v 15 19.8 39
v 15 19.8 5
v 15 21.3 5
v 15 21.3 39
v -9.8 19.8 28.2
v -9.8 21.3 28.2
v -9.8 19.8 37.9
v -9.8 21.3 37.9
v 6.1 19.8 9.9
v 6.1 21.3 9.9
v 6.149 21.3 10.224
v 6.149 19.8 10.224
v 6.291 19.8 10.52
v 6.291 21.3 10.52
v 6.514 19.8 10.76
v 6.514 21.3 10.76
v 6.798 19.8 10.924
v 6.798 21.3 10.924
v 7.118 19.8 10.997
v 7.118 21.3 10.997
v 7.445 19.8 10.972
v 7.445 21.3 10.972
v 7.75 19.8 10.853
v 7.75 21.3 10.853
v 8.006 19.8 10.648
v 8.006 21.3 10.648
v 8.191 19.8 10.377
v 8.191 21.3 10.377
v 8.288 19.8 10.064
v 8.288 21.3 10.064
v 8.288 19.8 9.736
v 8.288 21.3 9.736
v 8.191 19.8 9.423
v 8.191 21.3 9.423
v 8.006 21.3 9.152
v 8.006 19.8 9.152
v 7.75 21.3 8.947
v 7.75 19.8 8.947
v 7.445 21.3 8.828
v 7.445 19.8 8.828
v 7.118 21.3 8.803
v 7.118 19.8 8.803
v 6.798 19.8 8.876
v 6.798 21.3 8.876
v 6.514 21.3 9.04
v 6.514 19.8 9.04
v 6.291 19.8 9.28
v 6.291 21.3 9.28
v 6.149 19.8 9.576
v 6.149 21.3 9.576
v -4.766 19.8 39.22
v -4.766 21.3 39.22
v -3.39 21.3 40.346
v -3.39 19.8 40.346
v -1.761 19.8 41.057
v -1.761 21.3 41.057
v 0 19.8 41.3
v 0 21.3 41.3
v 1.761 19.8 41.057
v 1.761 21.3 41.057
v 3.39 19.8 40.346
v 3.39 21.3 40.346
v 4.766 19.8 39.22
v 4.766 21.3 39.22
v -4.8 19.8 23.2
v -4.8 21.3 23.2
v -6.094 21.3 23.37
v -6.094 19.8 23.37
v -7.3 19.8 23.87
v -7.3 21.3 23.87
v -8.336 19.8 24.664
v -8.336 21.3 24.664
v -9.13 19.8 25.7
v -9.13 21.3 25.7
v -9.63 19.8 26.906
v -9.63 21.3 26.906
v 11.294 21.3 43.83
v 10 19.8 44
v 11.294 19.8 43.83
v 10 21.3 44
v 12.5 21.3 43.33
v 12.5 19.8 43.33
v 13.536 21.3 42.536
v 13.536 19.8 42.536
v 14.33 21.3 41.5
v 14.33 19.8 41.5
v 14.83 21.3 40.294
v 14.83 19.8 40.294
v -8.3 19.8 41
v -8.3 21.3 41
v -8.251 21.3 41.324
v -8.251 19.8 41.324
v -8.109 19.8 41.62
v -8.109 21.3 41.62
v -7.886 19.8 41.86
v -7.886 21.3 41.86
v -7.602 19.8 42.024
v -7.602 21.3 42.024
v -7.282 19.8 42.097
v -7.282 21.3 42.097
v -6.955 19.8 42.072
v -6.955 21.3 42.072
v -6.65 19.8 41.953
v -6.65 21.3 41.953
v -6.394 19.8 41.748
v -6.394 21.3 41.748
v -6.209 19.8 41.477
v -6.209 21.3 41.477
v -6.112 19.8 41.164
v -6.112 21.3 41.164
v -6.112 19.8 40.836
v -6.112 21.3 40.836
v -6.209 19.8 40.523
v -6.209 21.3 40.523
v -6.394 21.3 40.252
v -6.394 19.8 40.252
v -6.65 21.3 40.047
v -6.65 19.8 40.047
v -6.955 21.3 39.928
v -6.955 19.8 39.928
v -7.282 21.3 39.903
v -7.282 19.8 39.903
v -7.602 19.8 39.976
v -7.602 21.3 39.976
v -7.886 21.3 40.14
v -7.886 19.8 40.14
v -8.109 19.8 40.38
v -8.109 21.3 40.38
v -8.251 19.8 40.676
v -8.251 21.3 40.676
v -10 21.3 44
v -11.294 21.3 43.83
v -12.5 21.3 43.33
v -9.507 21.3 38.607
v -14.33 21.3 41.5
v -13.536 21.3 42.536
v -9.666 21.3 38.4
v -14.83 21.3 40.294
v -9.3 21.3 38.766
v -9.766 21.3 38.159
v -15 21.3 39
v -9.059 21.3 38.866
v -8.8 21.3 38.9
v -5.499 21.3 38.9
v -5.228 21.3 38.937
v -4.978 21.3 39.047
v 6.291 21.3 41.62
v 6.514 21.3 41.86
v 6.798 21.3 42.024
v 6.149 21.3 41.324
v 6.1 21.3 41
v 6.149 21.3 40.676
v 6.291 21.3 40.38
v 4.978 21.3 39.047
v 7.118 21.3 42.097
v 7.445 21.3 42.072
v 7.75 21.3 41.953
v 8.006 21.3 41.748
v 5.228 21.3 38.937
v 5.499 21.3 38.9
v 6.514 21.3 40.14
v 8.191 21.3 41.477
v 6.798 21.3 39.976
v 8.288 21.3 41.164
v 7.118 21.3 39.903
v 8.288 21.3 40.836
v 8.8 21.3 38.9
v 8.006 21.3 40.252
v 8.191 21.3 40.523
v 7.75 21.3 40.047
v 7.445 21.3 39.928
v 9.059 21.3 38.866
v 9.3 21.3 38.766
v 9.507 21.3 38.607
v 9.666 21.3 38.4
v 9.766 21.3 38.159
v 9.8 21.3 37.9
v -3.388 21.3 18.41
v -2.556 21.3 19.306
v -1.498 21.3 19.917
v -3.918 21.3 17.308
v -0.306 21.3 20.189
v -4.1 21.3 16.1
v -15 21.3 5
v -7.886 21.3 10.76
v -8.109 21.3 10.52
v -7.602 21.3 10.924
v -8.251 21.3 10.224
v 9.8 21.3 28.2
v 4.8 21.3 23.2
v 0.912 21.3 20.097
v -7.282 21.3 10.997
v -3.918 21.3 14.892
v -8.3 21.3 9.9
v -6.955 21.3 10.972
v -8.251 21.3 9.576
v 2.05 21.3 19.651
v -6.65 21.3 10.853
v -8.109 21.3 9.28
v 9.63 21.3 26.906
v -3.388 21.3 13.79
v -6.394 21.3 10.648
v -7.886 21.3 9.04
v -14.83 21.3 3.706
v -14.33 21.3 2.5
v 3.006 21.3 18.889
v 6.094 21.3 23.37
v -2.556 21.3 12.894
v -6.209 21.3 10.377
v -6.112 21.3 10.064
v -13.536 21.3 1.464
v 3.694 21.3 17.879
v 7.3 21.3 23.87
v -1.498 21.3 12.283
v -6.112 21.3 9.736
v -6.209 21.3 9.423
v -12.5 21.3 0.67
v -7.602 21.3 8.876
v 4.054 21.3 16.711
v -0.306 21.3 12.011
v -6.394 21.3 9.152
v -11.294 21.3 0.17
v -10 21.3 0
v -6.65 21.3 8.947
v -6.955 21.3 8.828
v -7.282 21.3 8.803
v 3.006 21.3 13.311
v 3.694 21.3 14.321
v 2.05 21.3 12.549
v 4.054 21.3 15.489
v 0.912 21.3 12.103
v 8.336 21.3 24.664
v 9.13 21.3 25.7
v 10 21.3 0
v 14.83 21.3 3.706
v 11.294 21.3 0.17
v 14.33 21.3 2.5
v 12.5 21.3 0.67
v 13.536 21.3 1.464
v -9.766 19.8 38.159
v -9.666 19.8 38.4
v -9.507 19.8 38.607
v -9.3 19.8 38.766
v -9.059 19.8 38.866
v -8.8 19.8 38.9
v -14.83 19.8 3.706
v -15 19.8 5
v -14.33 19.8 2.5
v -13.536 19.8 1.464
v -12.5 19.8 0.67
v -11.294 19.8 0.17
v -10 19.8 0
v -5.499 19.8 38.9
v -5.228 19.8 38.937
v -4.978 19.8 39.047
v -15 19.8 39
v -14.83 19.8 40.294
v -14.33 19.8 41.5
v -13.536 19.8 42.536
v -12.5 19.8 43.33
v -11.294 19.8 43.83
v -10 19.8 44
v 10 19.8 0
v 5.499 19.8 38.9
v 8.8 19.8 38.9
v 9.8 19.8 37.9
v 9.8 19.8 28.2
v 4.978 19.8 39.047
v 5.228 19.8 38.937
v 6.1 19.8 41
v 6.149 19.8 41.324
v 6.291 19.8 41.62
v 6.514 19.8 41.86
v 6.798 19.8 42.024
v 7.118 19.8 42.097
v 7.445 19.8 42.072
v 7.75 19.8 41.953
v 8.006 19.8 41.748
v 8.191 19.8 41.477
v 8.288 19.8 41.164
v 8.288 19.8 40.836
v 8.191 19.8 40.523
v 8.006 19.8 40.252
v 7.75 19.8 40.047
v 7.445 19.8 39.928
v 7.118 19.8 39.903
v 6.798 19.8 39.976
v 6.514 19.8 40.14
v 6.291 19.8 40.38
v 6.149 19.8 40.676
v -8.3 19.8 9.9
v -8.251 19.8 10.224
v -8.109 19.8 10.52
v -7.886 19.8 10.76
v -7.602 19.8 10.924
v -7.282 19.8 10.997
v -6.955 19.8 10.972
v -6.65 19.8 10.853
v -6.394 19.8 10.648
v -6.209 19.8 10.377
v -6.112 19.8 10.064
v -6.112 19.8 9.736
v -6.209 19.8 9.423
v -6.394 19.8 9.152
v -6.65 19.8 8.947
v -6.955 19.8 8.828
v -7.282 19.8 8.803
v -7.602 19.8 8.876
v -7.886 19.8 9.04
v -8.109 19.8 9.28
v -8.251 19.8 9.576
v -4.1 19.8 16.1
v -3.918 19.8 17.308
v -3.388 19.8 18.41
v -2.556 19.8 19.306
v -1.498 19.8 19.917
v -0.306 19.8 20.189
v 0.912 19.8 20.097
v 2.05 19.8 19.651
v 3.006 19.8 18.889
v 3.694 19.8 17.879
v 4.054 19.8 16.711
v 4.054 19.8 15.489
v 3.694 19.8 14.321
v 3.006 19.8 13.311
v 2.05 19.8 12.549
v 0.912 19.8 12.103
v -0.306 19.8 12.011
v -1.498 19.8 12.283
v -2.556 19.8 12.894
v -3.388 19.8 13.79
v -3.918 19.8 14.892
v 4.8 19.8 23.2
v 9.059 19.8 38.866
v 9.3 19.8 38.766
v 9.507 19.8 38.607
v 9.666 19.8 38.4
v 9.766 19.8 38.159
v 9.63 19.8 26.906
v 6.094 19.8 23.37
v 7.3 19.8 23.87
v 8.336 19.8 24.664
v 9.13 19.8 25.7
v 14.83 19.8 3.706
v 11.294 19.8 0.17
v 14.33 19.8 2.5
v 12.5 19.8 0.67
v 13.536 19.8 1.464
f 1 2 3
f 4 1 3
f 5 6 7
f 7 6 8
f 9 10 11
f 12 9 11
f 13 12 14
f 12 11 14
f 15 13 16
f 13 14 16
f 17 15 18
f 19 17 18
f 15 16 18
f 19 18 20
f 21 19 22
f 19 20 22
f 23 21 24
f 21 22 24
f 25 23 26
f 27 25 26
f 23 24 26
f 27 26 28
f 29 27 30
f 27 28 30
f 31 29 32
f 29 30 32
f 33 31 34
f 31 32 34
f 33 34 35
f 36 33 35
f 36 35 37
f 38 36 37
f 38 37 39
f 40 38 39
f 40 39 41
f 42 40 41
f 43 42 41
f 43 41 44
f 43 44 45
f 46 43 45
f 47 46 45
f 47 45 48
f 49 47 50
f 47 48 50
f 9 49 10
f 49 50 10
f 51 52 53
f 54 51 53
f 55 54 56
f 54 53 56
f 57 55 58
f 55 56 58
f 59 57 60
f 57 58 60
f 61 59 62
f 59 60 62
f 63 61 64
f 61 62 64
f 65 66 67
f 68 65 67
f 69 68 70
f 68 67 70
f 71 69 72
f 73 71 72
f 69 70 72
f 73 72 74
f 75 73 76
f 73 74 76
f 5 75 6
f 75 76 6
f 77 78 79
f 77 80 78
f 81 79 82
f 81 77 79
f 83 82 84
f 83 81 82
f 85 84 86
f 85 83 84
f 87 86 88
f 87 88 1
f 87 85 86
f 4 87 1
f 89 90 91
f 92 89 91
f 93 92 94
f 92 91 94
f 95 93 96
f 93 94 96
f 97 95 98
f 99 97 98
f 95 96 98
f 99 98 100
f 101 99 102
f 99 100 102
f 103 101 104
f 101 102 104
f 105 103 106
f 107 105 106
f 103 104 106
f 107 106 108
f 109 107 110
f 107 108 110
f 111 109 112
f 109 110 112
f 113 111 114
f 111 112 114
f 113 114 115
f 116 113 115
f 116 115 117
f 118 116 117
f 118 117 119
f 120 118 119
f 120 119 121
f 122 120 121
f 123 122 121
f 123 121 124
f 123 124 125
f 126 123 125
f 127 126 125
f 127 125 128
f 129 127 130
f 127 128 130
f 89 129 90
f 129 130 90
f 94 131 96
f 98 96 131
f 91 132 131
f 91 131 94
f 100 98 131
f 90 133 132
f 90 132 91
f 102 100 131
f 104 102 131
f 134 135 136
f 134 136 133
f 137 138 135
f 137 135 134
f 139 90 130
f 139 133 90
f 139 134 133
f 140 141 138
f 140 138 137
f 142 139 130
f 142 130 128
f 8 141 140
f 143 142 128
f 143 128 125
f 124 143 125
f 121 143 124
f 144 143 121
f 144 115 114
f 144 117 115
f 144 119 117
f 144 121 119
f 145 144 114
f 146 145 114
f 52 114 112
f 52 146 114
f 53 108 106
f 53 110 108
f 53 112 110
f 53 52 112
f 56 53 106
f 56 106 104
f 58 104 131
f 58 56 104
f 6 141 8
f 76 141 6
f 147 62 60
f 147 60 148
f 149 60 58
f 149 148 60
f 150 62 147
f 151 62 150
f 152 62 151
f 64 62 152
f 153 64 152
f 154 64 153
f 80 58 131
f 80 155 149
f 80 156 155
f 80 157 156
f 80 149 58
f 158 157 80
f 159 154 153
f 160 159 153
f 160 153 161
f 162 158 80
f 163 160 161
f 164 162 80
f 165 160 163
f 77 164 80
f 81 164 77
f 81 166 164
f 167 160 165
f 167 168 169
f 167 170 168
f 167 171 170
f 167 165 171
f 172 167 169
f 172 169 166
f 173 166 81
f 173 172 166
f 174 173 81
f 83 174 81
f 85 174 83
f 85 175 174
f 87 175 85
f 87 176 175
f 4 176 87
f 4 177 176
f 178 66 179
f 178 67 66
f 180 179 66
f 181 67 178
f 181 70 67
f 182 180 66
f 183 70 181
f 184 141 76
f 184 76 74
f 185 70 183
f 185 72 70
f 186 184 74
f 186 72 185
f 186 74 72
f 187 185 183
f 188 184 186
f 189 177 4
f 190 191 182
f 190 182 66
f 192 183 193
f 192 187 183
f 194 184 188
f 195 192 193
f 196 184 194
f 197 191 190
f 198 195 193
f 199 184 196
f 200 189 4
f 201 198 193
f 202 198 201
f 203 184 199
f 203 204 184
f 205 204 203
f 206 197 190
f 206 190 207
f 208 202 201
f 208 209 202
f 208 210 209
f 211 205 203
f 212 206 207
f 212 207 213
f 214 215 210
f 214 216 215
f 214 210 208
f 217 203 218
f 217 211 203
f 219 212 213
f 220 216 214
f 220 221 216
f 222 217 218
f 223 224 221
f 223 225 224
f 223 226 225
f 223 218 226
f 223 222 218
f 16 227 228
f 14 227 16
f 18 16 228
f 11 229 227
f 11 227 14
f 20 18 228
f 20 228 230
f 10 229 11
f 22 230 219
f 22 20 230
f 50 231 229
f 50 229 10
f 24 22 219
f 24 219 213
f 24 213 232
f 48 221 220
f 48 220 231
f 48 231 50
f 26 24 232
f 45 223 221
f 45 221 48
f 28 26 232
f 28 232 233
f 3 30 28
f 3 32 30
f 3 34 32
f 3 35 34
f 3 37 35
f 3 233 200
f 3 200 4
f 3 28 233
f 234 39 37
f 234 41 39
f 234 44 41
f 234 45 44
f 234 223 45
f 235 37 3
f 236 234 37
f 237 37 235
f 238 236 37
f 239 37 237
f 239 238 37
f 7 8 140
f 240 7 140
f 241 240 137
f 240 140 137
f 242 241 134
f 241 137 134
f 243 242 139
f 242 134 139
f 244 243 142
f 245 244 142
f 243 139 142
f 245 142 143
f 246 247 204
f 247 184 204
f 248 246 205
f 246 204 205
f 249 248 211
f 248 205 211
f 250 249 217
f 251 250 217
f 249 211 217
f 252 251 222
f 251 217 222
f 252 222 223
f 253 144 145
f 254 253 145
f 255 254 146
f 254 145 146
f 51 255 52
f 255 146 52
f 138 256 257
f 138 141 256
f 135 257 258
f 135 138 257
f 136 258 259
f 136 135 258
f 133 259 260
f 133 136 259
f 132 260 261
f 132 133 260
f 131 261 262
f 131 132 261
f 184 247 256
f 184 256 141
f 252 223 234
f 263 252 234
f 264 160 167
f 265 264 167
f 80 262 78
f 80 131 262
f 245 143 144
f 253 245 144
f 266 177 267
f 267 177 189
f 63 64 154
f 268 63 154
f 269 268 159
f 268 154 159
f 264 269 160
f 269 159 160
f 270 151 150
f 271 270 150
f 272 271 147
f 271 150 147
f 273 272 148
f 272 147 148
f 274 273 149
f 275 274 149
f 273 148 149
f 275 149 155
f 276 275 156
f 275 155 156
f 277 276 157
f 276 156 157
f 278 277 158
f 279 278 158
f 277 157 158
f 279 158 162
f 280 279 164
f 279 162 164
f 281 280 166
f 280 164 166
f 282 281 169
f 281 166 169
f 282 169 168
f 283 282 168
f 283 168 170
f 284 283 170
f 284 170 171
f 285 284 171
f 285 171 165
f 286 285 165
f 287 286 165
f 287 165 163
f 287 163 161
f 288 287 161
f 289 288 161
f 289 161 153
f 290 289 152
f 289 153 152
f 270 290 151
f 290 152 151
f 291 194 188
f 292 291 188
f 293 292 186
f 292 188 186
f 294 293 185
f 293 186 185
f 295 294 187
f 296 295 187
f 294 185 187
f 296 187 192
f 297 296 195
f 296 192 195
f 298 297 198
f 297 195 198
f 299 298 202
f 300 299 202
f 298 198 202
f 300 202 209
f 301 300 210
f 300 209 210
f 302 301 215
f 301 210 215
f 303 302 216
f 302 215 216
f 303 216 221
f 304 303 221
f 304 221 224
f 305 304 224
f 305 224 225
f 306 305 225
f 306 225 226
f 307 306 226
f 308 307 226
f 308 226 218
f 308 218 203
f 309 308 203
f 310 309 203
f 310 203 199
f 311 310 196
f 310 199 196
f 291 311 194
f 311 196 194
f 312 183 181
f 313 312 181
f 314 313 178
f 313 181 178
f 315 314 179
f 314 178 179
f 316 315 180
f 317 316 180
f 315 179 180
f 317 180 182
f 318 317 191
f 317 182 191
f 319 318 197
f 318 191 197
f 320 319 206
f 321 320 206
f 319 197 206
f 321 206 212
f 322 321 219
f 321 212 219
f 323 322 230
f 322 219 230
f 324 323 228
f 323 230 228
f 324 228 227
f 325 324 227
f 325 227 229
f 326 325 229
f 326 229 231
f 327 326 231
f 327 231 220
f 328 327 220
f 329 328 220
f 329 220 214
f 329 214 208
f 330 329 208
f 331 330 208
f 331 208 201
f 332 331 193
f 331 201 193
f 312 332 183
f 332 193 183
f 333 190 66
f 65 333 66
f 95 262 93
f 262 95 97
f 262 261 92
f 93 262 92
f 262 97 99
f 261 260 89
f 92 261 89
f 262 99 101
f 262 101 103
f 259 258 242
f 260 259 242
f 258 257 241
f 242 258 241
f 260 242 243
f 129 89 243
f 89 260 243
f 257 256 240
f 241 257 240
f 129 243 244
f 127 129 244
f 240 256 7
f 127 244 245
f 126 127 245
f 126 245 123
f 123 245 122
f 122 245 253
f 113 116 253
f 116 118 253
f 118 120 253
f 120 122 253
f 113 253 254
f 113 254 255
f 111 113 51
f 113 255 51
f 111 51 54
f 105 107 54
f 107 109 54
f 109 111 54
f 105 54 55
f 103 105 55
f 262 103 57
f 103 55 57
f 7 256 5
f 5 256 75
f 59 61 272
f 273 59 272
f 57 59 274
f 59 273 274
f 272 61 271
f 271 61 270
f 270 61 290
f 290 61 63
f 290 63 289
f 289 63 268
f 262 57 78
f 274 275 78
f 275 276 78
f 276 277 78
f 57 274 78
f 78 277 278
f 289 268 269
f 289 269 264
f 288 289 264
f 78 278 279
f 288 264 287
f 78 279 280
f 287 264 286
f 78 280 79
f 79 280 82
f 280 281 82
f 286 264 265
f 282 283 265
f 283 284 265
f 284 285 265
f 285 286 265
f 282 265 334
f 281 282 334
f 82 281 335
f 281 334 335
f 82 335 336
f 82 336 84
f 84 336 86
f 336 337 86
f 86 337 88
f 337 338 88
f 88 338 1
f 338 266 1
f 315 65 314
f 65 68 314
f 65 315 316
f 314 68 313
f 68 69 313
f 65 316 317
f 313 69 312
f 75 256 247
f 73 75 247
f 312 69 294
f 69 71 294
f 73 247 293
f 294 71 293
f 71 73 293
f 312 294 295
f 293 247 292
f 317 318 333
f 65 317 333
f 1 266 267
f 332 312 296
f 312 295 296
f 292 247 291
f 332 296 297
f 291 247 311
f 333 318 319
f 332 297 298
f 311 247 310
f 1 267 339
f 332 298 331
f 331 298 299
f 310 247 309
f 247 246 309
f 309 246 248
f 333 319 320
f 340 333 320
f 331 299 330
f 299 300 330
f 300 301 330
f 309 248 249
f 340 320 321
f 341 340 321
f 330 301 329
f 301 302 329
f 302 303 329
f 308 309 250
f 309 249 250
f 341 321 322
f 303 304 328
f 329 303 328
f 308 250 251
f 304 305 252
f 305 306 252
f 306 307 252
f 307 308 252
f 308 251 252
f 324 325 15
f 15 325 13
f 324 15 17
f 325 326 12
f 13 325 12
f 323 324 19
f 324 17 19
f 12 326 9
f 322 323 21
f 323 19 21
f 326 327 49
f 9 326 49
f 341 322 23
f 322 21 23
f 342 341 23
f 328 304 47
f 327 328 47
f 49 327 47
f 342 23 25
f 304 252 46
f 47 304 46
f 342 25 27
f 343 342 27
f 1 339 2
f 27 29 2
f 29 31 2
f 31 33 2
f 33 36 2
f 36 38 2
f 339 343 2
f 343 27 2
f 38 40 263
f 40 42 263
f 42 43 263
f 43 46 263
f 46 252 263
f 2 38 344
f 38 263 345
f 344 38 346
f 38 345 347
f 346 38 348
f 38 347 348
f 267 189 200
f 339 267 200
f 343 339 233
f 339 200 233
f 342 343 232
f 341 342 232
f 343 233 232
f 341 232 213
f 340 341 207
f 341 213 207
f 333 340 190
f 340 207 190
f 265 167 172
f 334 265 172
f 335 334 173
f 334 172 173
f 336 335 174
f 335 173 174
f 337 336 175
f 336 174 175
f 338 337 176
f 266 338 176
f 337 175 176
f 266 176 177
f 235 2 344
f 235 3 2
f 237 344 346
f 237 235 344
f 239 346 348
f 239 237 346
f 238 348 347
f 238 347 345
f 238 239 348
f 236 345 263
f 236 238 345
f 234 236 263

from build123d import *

# Parameters (mm, degrees)
F0_W     = 74.4
F0_H     = 39.6
F0_R     = 1
F0_R_2   = 4.1
F1_DEPTH = 1.5
F2_W     = 30
F2_H     = 1.5
F3_DEPTH = 44
F4_R     = 1.1
F4_R_2   = 4.1
F5_DEPTH = 1.5
F6_R     = 5
F7_W     = 74.4
F7_H     = 39.6
F8_DEPTH = 1.5
F9_R     = 5


with BuildPart() as f1:
    # F0 (on Top) → F1 (new body)
    with BuildSketch(Plane.XY):
        Rectangle(F0_W, F0_H)
        with Locations((-32.2, -16.8)):
            Circle(F0_R, mode=Mode.SUBTRACT)
        with Locations((-25, -10.6)):
            Circle(F0_R_2, mode=Mode.SUBTRACT)
        with Locations((-17.8, -16.8)):
            Circle(F0_R, mode=Mode.SUBTRACT)
        with Locations((17.8, -16.8)):
            Circle(F0_R, mode=Mode.SUBTRACT)
        with Locations((32.2, -16.8)):
            Circle(F0_R, mode=Mode.SUBTRACT)
        with Locations((25, -10.6)):
            Circle(F0_R_2, mode=Mode.SUBTRACT)
        with BuildLine():
            ThreePointArc((-34.8, 11.6), (-34.507107, 12.307107), (-33.8, 12.6))
            Line((-33.8, 12.6), (-30.123475, 12.6))
            ThreePointArc((-30.123475, 12.6), (-25, 15.1), (-19.876525, 12.6))
            Line((-19.876525, 12.6), (-16.2, 12.6))
            ThreePointArc((-16.2, 12.6), (-15.492893, 12.307107), (-15.2, 11.6))
            Line((-15.2, 11.6), (-15.2, 1.9))
            ThreePointArc((-15.2, 1.9), (-16.664466, -1.635534), (-20.2, -3.1))
            Line((-20.2, -3.1), (-29.8, -3.1))
            ThreePointArc((-29.8, -3.1), (-33.335534, -1.635534), (-34.8, 1.9))
            Line((-34.8, 1.9), (-34.8, 11.6))
        make_face(mode=Mode.SUBTRACT)
        with Locations((-32.2, 14.8)):
            Circle(F0_R, mode=Mode.SUBTRACT)
        with Locations((-17.8, 14.8)):
            Circle(F0_R, mode=Mode.SUBTRACT)
        with BuildLine():
            Line((15.2, 1.9), (15.2, 11.6))
            ThreePointArc((15.2, 11.6), (15.492893, 12.307107), (16.2, 12.6))
            Line((16.2, 12.6), (19.876525, 12.6))
            ThreePointArc((19.876525, 12.6), (25, 15.1), (30.123475, 12.6))
            Line((30.123475, 12.6), (33.8, 12.6))
            ThreePointArc((33.8, 12.6), (34.507107, 12.307107), (34.8, 11.6))
            Line((34.8, 11.6), (34.8, 1.9))
            ThreePointArc((34.8, 1.9), (33.335534, -1.635534), (29.8, -3.1))
            Line((29.8, -3.1), (20.2, -3.1))
            ThreePointArc((20.2, -3.1), (16.664466, -1.635534), (15.2, 1.9))
        make_face(mode=Mode.SUBTRACT)
        with Locations((17.8, 14.8)):
            Circle(F0_R, mode=Mode.SUBTRACT)
        with Locations((32.2, 14.8)):
            Circle(F0_R, mode=Mode.SUBTRACT)
    extrude(amount=F1_DEPTH)

    # F2 (on Top) → F3 (join)
    with BuildSketch(Plane.XY):
        with Locations((0, 20.55)):
            Rectangle(F2_W, F2_H)
    extrude(amount=F3_DEPTH)

    # F4 (on face) → F5 (cut, through all)
    with BuildSketch(Plane(origin=(0, 21.3, 0), x_dir=(-1, 0, 0), z_dir=(0, 1, 0))):
        with Locations((7.2, 41)):
            Circle(F4_R)
        with Locations((7.2, 9.9)):
            Circle(F4_R)
        with Locations((0, 16.1)):
            Circle(F4_R_2)
        with BuildLine():
            ThreePointArc((9.8, 37.9), (9.507107, 38.607107), (8.8, 38.9))
            Line((8.8, 38.9), (5.499091, 38.9))
            ThreePointArc((5.499091, 38.9), (5.099091, 38.983485), (4.765879, 39.22))
            ThreePointArc((4.765879, 39.22), (0, 41.3), (-4.765879, 39.22))
            ThreePointArc((-4.765879, 39.22), (-5.099091, 38.983485), (-5.499091, 38.9))
            Line((-5.499091, 38.9), (-8.8, 38.9))
            ThreePointArc((-8.8, 38.9), (-9.507107, 38.607107), (-9.8, 37.9))
            Line((-9.8, 37.9), (-9.8, 28.2))
            ThreePointArc((-9.8, 28.2), (-8.335534, 24.664466), (-4.8, 23.2))
            Line((-4.8, 23.2), (4.8, 23.2))
            ThreePointArc((4.8, 23.2), (8.335534, 24.664466), (9.8, 28.2))
            Line((9.8, 28.2), (9.8, 37.9))
        make_face()
        with Locations((-7.2, 41)):
            Circle(F4_R)
        with Locations((-7.2, 9.9)):
            Circle(F4_R)
    extrude(amount=-F5_DEPTH, mode=Mode.SUBTRACT)

    # F6
    f6_edges = [f1.edges().sort_by_distance(p)[0] for p in [
        (-37.2, 19.8, 0.75),
        (-37.2, -19.8, 0.75),
        (37.2, 19.8, 0.75),
        (37.2, -19.8, 0.75),
        (-15, 20.55, 44),
        (15, 20.55, 44),
    ]]
    fillet(f6_edges, radius=F6_R)

    # F7 (on face) → F8 (cut, through all)
    with BuildSketch(Plane.XY.offset(1.5)):
        Rectangle(F7_W, F7_H)
    extrude(amount=-F8_DEPTH, mode=Mode.SUBTRACT)

    # F9
    f9_edges = [f1.edges().sort_by_distance(p)[0] for p in [
        (-15, 20.55, 0),
        (15, 20.55, 0),
    ]]
    fillet(f9_edges, radius=F9_R)


solid = f1.part
